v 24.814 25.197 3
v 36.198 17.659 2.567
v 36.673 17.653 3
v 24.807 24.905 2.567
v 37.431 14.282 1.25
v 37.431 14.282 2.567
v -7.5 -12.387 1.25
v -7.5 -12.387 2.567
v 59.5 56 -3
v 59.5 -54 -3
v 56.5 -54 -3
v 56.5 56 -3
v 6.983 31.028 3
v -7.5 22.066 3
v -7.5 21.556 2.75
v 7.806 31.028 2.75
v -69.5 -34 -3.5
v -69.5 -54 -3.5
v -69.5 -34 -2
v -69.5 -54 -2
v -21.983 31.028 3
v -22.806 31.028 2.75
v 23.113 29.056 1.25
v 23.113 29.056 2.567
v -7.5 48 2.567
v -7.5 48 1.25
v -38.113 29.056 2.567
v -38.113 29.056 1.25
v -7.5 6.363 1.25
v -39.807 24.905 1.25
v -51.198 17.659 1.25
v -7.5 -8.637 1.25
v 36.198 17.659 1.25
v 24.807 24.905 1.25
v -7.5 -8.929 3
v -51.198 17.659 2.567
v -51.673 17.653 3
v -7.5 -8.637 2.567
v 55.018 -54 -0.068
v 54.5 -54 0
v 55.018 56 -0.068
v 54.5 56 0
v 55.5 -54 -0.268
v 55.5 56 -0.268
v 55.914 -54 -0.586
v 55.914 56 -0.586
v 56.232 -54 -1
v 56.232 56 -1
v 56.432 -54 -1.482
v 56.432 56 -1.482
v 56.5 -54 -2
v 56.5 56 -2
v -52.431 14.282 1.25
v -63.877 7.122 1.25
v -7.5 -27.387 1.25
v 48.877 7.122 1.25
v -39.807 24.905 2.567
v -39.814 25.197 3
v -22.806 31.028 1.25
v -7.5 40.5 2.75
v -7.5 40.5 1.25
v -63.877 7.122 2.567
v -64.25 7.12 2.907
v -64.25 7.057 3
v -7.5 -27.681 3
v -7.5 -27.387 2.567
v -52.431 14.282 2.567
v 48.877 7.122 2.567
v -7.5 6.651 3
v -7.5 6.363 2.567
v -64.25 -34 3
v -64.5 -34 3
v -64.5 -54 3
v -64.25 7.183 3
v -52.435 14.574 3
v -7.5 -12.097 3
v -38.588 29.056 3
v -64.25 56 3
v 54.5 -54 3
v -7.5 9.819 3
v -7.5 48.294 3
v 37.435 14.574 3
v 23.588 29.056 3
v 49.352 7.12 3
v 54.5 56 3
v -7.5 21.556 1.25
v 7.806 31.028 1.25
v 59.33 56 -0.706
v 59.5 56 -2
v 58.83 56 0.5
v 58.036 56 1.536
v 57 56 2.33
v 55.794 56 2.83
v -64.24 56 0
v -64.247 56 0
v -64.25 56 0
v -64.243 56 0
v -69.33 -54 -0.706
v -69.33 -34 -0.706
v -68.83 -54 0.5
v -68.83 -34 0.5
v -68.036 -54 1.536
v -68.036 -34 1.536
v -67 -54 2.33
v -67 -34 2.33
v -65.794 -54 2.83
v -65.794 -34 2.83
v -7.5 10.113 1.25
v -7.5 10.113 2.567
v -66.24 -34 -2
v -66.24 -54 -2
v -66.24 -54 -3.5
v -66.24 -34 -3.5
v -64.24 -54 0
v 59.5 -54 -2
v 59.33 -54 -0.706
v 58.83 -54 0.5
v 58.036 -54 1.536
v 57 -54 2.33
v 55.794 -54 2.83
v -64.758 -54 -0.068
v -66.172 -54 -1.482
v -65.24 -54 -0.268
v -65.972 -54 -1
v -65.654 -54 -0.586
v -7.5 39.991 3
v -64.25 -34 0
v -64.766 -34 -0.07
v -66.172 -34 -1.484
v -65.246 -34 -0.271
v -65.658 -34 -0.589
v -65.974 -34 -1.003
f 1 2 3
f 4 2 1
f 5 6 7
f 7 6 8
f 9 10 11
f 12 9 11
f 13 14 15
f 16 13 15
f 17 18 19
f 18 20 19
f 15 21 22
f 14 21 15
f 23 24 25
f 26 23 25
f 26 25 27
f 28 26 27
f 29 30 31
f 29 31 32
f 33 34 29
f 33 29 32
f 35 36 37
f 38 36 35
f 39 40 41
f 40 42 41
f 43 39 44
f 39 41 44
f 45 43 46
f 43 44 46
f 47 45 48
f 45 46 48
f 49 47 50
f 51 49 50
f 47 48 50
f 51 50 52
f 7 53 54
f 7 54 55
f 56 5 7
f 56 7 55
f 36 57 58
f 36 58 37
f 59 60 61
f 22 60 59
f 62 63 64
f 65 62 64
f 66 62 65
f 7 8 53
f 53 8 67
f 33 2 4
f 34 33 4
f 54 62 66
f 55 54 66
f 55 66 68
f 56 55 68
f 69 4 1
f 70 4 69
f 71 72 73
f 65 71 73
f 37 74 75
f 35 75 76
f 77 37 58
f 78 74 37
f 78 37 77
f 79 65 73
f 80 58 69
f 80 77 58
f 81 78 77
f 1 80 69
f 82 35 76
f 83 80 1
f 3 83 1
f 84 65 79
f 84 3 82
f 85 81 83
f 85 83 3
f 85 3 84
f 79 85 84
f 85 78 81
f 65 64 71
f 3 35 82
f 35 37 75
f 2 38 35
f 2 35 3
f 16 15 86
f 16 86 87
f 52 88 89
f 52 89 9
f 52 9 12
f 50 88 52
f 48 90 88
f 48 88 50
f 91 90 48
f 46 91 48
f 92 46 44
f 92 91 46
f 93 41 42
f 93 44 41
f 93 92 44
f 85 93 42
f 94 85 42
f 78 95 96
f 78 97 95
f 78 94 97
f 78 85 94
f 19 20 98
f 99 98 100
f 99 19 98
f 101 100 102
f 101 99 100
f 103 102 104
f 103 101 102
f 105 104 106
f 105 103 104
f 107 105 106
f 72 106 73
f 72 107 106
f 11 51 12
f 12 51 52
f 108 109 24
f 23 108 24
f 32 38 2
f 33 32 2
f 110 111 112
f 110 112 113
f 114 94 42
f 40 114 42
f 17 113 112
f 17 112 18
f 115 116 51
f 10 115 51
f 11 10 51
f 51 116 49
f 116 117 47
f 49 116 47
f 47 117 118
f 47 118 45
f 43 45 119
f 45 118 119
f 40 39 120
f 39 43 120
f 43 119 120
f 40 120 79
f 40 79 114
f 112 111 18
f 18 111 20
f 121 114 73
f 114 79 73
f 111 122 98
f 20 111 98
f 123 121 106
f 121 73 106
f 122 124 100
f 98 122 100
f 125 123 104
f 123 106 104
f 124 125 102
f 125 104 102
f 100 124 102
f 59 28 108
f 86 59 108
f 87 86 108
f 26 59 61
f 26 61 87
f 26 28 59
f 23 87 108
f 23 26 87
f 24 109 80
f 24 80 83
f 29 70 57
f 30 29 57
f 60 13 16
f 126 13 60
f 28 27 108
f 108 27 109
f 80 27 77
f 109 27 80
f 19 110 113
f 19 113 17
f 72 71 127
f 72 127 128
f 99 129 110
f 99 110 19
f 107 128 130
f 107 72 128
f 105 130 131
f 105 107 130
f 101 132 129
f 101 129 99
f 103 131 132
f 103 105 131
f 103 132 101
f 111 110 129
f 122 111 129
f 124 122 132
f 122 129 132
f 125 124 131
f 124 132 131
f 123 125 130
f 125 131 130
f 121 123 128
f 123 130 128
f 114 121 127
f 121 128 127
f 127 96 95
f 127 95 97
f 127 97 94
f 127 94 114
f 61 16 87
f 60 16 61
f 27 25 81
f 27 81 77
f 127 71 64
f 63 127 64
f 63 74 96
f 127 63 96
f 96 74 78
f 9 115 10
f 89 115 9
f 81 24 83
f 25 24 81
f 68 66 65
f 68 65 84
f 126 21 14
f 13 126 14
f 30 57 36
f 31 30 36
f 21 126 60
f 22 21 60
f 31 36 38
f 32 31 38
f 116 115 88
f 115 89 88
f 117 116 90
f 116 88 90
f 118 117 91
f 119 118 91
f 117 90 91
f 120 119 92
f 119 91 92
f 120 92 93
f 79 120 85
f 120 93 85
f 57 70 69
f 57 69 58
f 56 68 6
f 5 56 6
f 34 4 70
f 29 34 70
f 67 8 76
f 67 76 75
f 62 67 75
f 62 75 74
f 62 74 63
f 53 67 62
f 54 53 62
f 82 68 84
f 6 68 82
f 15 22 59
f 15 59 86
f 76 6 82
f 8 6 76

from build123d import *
from OCP.BRepFilletAPI import BRepFilletAPI_MakeChamfer

# Parameters (mm, degrees)
SKETCH1_W           = 129
SKETCH1_H           = 110
BOSS_EXTRUDE1_DEPTH = 3
SKETCH8_W           = 3
SKETCH8_H           = 110
BOSS_EXTRUDE5_DEPTH = 3
FILLET4_R           = 2
FILLET5_R           = 5
SKETCH9_W           = 1
SKETCH9_H           = 110
BOSS_EXTRUDE6_DEPTH = 2.5
BOSS_EXTRUDE7_DEPTH = 110
CUT_EXTRUDE3_DEPTH  = 1.75
CHAMFER3_SIZE       = 0.25
CHAMFER3_SIZE2      = 0.433012702
SKETCH14_W          = 3.26
SKETCH14_H          = 110
BOSS_EXTRUDE8_DEPTH = 3.5
FILLET6_R           = 2
FILLET7_R           = 5
CUT_EXTRUDE4_START  = -6.5
SKETCH17_W          = 5.25
SKETCH17_H          = 90
CUT_EXTRUDE4_DEPTH  = 6.5
SKETCH18_W          = 3
SKETCH18_H          = 3.302013378
CUT_EXTRUDE5_DEPTH  = 110


with BuildPart() as part:
    # Sketch1 → Boss-Extrude1 (new body)
    with BuildSketch(Plane.XY):
        with Locations((-5, 1)):
            Rectangle(SKETCH1_W, SKETCH1_H)
    extrude(amount=BOSS_EXTRUDE1_DEPTH)

    # Sketch8 → Boss-Extrude5 (add)
    with BuildSketch(Plane(origin=(0, 0, 0), x_dir=(-1, 0, 0), z_dir=(0, 0, -1))):
        with Locations((-58, 1)):
            Rectangle(SKETCH8_W, SKETCH8_H)
    extrude(amount=BOSS_EXTRUDE5_DEPTH)

    # Fillet4
    fillet4_edges = [part.edges().sort_by_distance(p)[0] for p in [
        (56.5, 1, 0),
    ]]
    fillet(fillet4_edges, radius=FILLET4_R)

    # Fillet5
    fillet5_edges = [part.edges().sort_by_distance(p)[0] for p in [
        (59.5, 1, 3),
    ]]
    fillet(fillet5_edges, radius=FILLET5_R)

    # Sketch9 → Boss-Extrude6 (add)
    with BuildSketch(Plane(origin=(0, 0, -3), x_dir=(-1, 0, 0), z_dir=(0, 0, -1))):
        with Locations((-58, 1)):
            Rectangle(SKETCH9_W, SKETCH9_H)
    extrude(amount=BOSS_EXTRUDE6_DEPTH)

    # Sketch10 → Boss-Extrude7 (add, through all)
    with BuildSketch(Plane(origin=(0, 56, 0), x_dir=(1, 0, 0), z_dir=(0, 1, 0))):
        Polygon((57.5, 5.5), (57, 3), (57.5, 3), align=None)
    extrude(amount=-BOSS_EXTRUDE7_DEPTH)

    # Sketch13 → Cut-Extrude3 (cut)
    # profile 1 of 3: a face of its own
    with BuildSketch(Plane.XY.offset(3)):
        Polygon((-7.5, 48), (-38.1126801, 29.056298749), (-7.5, 10.112597497), (23.1126801, 29.056298749), align=None)
        Polygon((-7.5, 40.5), (-22.80634005, 31.028149374), (-7.5, 21.556298749), (7.80634005, 31.028149374), align=None, mode=Mode.SUBTRACT)
    # profile 2 of 3: a face of its own
    with BuildSketch(Plane.XY.offset(3)):
        Polygon((-39.806973372, 24.905034542), (-51.197681844, 17.659224685), (-7.5, -8.637402503), (36.197681844, 17.659224685), (24.806973372, 24.905034542), (-7.5, 6.362597497), align=None)
    # profile 3 of 3: a face of its own
    with BuildSketch(Plane.XY.offset(3)):
        Polygon((-52.431392449, 14.281539595), (-63.876517147, 7.121992079), (-7.5, -27.387402503), (48.876517147, 7.121992079), (37.431392449, 14.281539595), (-7.5, -12.387402503), align=None)
    extrude(amount=-CUT_EXTRUDE3_DEPTH, mode=Mode.SUBTRACT)

    # Chamfer3: one chamfer whose edges measure the first distance from different faces: ONE call of the kernel's chamfer builder (chamfer() names one face for all edges)
    chamfer3_edges_1 = [part.edges().sort_by_distance(p)[0] for p in [
        (-23.653486686, 15.63381602, 3),
        (-45.502327608, 21.282129613, 3),
        (-29.348840922, 4.510911091, 3),
        (14.348840922, 4.510911091, 3),
        (30.502327608, 21.282129613, 3),
        (8.653486686, 15.63381602, 3),
        (-29.965696224, 0.947068546, 3),
        (-58.153954798, 10.701765837, 3),
        (-35.688258573, -10.132705212, 3),
        (20.688258573, -10.132705212, 3),
        (43.153954798, 10.701765837, 3),
        (14.965696224, 0.947068546, 3),
        (7.80634005, 38.528149374, 3),
        (-22.80634005, 38.528149374, 3),
        (-22.80634005, 19.584448123, 3),
        (7.80634005, 19.584448123, 3),
    ]]
    chamfer3_side_1 = [part.faces().sort_by_distance(p)[0] for p in [
        (-7.5, 54.34241139, 3),
    ]]
    chamfer3_edges_2 = [part.edges().sort_by_distance(p)[0] for p in [
        (0.153170025, 35.764074687, 3),
    ]]
    chamfer3_side_2 = [part.faces().sort_by_distance(p)[0] for p in [
        (0.153170025, 35.764074687, 2.125),
    ]]
    chamfer3_edges_3 = [part.edges().sort_by_distance(p)[0] for p in [
        (0.153170025, 26.292224061, 3),
    ]]
    chamfer3_side_3 = [part.faces().sort_by_distance(p)[0] for p in [
        (0.153170025, 26.292224061, 2.125),
    ]]
    chamfer3_edges_4 = [part.edges().sort_by_distance(p)[0] for p in [
        (-15.153170025, 26.292224061, 3),
    ]]
    chamfer3_side_4 = [part.faces().sort_by_distance(p)[0] for p in [
        (-15.153170025, 26.292224061, 2.125),
    ]]
    chamfer3_edges_5 = [part.edges().sort_by_distance(p)[0] for p in [
        (-15.153170025, 35.764074687, 3),
    ]]
    chamfer3_side_5 = [part.faces().sort_by_distance(p)[0] for p in [
        (-15.153170025, 35.764074687, 2.125),
    ]]
    chamfer3 = BRepFilletAPI_MakeChamfer(part.part.solid().wrapped)
    for e in chamfer3_edges_1:
        chamfer3.Add(CHAMFER3_SIZE, CHAMFER3_SIZE2, e.wrapped, chamfer3_side_1[0].wrapped)  # the first distance lies on this face
    for e in chamfer3_edges_2:
        chamfer3.Add(CHAMFER3_SIZE, CHAMFER3_SIZE2, e.wrapped, chamfer3_side_2[0].wrapped)  # the first distance lies on this face
    for e in chamfer3_edges_3:
        chamfer3.Add(CHAMFER3_SIZE, CHAMFER3_SIZE2, e.wrapped, chamfer3_side_3[0].wrapped)  # the first distance lies on this face
    for e in chamfer3_edges_4:
        chamfer3.Add(CHAMFER3_SIZE, CHAMFER3_SIZE2, e.wrapped, chamfer3_side_4[0].wrapped)  # the first distance lies on this face
    for e in chamfer3_edges_5:
        chamfer3.Add(CHAMFER3_SIZE, CHAMFER3_SIZE2, e.wrapped, chamfer3_side_5[0].wrapped)  # the first distance lies on this face
    add(Compound.cast(chamfer3.Shape()), mode=Mode.REPLACE)

    # Sketch14 → Boss-Extrude8 (add)
    with BuildSketch(Plane(origin=(0, 0, 0), x_dir=(-1, 0, 0), z_dir=(0, 0, -1))):
        with Locations((67.87, 1)):
            Rectangle(SKETCH14_W, SKETCH14_H)
    extrude(amount=BOSS_EXTRUDE8_DEPTH)

    # Fillet6
    fillet6_edges = [part.edges().sort_by_distance(p)[0] for p in [
        (-66.24, 1, 0),
    ]]
    fillet(fillet6_edges, radius=FILLET6_R)

    # Fillet7
    fillet7_edges = [part.edges().sort_by_distance(p)[0] for p in [
        (-69.5, 1, 3),
    ]]
    fillet(fillet7_edges, radius=FILLET7_R)

    # Sketch17 → Cut-Extrude4 (cut)
    with BuildSketch(Plane(origin=(0, 0, -3.5), x_dir=(-1, 0, 0), z_dir=(0, 0, -1)).offset(CUT_EXTRUDE4_START)):
        with Locations((66.875, 11)):
            Rectangle(SKETCH17_W, SKETCH17_H)
    extrude(amount=CUT_EXTRUDE4_DEPTH, mode=Mode.SUBTRACT)

    # Sketch18 → Cut-Extrude5 (cut)
    with BuildSketch(Plane(origin=(0, 56, 0), x_dir=(1, 0, 0), z_dir=(0, 1, 0))):
        with Locations((58, 4.651006689)):
            Rectangle(SKETCH18_W, SKETCH18_H)
    extrude(amount=-CUT_EXTRUDE5_DEPTH, mode=Mode.SUBTRACT)


solid = part.part
